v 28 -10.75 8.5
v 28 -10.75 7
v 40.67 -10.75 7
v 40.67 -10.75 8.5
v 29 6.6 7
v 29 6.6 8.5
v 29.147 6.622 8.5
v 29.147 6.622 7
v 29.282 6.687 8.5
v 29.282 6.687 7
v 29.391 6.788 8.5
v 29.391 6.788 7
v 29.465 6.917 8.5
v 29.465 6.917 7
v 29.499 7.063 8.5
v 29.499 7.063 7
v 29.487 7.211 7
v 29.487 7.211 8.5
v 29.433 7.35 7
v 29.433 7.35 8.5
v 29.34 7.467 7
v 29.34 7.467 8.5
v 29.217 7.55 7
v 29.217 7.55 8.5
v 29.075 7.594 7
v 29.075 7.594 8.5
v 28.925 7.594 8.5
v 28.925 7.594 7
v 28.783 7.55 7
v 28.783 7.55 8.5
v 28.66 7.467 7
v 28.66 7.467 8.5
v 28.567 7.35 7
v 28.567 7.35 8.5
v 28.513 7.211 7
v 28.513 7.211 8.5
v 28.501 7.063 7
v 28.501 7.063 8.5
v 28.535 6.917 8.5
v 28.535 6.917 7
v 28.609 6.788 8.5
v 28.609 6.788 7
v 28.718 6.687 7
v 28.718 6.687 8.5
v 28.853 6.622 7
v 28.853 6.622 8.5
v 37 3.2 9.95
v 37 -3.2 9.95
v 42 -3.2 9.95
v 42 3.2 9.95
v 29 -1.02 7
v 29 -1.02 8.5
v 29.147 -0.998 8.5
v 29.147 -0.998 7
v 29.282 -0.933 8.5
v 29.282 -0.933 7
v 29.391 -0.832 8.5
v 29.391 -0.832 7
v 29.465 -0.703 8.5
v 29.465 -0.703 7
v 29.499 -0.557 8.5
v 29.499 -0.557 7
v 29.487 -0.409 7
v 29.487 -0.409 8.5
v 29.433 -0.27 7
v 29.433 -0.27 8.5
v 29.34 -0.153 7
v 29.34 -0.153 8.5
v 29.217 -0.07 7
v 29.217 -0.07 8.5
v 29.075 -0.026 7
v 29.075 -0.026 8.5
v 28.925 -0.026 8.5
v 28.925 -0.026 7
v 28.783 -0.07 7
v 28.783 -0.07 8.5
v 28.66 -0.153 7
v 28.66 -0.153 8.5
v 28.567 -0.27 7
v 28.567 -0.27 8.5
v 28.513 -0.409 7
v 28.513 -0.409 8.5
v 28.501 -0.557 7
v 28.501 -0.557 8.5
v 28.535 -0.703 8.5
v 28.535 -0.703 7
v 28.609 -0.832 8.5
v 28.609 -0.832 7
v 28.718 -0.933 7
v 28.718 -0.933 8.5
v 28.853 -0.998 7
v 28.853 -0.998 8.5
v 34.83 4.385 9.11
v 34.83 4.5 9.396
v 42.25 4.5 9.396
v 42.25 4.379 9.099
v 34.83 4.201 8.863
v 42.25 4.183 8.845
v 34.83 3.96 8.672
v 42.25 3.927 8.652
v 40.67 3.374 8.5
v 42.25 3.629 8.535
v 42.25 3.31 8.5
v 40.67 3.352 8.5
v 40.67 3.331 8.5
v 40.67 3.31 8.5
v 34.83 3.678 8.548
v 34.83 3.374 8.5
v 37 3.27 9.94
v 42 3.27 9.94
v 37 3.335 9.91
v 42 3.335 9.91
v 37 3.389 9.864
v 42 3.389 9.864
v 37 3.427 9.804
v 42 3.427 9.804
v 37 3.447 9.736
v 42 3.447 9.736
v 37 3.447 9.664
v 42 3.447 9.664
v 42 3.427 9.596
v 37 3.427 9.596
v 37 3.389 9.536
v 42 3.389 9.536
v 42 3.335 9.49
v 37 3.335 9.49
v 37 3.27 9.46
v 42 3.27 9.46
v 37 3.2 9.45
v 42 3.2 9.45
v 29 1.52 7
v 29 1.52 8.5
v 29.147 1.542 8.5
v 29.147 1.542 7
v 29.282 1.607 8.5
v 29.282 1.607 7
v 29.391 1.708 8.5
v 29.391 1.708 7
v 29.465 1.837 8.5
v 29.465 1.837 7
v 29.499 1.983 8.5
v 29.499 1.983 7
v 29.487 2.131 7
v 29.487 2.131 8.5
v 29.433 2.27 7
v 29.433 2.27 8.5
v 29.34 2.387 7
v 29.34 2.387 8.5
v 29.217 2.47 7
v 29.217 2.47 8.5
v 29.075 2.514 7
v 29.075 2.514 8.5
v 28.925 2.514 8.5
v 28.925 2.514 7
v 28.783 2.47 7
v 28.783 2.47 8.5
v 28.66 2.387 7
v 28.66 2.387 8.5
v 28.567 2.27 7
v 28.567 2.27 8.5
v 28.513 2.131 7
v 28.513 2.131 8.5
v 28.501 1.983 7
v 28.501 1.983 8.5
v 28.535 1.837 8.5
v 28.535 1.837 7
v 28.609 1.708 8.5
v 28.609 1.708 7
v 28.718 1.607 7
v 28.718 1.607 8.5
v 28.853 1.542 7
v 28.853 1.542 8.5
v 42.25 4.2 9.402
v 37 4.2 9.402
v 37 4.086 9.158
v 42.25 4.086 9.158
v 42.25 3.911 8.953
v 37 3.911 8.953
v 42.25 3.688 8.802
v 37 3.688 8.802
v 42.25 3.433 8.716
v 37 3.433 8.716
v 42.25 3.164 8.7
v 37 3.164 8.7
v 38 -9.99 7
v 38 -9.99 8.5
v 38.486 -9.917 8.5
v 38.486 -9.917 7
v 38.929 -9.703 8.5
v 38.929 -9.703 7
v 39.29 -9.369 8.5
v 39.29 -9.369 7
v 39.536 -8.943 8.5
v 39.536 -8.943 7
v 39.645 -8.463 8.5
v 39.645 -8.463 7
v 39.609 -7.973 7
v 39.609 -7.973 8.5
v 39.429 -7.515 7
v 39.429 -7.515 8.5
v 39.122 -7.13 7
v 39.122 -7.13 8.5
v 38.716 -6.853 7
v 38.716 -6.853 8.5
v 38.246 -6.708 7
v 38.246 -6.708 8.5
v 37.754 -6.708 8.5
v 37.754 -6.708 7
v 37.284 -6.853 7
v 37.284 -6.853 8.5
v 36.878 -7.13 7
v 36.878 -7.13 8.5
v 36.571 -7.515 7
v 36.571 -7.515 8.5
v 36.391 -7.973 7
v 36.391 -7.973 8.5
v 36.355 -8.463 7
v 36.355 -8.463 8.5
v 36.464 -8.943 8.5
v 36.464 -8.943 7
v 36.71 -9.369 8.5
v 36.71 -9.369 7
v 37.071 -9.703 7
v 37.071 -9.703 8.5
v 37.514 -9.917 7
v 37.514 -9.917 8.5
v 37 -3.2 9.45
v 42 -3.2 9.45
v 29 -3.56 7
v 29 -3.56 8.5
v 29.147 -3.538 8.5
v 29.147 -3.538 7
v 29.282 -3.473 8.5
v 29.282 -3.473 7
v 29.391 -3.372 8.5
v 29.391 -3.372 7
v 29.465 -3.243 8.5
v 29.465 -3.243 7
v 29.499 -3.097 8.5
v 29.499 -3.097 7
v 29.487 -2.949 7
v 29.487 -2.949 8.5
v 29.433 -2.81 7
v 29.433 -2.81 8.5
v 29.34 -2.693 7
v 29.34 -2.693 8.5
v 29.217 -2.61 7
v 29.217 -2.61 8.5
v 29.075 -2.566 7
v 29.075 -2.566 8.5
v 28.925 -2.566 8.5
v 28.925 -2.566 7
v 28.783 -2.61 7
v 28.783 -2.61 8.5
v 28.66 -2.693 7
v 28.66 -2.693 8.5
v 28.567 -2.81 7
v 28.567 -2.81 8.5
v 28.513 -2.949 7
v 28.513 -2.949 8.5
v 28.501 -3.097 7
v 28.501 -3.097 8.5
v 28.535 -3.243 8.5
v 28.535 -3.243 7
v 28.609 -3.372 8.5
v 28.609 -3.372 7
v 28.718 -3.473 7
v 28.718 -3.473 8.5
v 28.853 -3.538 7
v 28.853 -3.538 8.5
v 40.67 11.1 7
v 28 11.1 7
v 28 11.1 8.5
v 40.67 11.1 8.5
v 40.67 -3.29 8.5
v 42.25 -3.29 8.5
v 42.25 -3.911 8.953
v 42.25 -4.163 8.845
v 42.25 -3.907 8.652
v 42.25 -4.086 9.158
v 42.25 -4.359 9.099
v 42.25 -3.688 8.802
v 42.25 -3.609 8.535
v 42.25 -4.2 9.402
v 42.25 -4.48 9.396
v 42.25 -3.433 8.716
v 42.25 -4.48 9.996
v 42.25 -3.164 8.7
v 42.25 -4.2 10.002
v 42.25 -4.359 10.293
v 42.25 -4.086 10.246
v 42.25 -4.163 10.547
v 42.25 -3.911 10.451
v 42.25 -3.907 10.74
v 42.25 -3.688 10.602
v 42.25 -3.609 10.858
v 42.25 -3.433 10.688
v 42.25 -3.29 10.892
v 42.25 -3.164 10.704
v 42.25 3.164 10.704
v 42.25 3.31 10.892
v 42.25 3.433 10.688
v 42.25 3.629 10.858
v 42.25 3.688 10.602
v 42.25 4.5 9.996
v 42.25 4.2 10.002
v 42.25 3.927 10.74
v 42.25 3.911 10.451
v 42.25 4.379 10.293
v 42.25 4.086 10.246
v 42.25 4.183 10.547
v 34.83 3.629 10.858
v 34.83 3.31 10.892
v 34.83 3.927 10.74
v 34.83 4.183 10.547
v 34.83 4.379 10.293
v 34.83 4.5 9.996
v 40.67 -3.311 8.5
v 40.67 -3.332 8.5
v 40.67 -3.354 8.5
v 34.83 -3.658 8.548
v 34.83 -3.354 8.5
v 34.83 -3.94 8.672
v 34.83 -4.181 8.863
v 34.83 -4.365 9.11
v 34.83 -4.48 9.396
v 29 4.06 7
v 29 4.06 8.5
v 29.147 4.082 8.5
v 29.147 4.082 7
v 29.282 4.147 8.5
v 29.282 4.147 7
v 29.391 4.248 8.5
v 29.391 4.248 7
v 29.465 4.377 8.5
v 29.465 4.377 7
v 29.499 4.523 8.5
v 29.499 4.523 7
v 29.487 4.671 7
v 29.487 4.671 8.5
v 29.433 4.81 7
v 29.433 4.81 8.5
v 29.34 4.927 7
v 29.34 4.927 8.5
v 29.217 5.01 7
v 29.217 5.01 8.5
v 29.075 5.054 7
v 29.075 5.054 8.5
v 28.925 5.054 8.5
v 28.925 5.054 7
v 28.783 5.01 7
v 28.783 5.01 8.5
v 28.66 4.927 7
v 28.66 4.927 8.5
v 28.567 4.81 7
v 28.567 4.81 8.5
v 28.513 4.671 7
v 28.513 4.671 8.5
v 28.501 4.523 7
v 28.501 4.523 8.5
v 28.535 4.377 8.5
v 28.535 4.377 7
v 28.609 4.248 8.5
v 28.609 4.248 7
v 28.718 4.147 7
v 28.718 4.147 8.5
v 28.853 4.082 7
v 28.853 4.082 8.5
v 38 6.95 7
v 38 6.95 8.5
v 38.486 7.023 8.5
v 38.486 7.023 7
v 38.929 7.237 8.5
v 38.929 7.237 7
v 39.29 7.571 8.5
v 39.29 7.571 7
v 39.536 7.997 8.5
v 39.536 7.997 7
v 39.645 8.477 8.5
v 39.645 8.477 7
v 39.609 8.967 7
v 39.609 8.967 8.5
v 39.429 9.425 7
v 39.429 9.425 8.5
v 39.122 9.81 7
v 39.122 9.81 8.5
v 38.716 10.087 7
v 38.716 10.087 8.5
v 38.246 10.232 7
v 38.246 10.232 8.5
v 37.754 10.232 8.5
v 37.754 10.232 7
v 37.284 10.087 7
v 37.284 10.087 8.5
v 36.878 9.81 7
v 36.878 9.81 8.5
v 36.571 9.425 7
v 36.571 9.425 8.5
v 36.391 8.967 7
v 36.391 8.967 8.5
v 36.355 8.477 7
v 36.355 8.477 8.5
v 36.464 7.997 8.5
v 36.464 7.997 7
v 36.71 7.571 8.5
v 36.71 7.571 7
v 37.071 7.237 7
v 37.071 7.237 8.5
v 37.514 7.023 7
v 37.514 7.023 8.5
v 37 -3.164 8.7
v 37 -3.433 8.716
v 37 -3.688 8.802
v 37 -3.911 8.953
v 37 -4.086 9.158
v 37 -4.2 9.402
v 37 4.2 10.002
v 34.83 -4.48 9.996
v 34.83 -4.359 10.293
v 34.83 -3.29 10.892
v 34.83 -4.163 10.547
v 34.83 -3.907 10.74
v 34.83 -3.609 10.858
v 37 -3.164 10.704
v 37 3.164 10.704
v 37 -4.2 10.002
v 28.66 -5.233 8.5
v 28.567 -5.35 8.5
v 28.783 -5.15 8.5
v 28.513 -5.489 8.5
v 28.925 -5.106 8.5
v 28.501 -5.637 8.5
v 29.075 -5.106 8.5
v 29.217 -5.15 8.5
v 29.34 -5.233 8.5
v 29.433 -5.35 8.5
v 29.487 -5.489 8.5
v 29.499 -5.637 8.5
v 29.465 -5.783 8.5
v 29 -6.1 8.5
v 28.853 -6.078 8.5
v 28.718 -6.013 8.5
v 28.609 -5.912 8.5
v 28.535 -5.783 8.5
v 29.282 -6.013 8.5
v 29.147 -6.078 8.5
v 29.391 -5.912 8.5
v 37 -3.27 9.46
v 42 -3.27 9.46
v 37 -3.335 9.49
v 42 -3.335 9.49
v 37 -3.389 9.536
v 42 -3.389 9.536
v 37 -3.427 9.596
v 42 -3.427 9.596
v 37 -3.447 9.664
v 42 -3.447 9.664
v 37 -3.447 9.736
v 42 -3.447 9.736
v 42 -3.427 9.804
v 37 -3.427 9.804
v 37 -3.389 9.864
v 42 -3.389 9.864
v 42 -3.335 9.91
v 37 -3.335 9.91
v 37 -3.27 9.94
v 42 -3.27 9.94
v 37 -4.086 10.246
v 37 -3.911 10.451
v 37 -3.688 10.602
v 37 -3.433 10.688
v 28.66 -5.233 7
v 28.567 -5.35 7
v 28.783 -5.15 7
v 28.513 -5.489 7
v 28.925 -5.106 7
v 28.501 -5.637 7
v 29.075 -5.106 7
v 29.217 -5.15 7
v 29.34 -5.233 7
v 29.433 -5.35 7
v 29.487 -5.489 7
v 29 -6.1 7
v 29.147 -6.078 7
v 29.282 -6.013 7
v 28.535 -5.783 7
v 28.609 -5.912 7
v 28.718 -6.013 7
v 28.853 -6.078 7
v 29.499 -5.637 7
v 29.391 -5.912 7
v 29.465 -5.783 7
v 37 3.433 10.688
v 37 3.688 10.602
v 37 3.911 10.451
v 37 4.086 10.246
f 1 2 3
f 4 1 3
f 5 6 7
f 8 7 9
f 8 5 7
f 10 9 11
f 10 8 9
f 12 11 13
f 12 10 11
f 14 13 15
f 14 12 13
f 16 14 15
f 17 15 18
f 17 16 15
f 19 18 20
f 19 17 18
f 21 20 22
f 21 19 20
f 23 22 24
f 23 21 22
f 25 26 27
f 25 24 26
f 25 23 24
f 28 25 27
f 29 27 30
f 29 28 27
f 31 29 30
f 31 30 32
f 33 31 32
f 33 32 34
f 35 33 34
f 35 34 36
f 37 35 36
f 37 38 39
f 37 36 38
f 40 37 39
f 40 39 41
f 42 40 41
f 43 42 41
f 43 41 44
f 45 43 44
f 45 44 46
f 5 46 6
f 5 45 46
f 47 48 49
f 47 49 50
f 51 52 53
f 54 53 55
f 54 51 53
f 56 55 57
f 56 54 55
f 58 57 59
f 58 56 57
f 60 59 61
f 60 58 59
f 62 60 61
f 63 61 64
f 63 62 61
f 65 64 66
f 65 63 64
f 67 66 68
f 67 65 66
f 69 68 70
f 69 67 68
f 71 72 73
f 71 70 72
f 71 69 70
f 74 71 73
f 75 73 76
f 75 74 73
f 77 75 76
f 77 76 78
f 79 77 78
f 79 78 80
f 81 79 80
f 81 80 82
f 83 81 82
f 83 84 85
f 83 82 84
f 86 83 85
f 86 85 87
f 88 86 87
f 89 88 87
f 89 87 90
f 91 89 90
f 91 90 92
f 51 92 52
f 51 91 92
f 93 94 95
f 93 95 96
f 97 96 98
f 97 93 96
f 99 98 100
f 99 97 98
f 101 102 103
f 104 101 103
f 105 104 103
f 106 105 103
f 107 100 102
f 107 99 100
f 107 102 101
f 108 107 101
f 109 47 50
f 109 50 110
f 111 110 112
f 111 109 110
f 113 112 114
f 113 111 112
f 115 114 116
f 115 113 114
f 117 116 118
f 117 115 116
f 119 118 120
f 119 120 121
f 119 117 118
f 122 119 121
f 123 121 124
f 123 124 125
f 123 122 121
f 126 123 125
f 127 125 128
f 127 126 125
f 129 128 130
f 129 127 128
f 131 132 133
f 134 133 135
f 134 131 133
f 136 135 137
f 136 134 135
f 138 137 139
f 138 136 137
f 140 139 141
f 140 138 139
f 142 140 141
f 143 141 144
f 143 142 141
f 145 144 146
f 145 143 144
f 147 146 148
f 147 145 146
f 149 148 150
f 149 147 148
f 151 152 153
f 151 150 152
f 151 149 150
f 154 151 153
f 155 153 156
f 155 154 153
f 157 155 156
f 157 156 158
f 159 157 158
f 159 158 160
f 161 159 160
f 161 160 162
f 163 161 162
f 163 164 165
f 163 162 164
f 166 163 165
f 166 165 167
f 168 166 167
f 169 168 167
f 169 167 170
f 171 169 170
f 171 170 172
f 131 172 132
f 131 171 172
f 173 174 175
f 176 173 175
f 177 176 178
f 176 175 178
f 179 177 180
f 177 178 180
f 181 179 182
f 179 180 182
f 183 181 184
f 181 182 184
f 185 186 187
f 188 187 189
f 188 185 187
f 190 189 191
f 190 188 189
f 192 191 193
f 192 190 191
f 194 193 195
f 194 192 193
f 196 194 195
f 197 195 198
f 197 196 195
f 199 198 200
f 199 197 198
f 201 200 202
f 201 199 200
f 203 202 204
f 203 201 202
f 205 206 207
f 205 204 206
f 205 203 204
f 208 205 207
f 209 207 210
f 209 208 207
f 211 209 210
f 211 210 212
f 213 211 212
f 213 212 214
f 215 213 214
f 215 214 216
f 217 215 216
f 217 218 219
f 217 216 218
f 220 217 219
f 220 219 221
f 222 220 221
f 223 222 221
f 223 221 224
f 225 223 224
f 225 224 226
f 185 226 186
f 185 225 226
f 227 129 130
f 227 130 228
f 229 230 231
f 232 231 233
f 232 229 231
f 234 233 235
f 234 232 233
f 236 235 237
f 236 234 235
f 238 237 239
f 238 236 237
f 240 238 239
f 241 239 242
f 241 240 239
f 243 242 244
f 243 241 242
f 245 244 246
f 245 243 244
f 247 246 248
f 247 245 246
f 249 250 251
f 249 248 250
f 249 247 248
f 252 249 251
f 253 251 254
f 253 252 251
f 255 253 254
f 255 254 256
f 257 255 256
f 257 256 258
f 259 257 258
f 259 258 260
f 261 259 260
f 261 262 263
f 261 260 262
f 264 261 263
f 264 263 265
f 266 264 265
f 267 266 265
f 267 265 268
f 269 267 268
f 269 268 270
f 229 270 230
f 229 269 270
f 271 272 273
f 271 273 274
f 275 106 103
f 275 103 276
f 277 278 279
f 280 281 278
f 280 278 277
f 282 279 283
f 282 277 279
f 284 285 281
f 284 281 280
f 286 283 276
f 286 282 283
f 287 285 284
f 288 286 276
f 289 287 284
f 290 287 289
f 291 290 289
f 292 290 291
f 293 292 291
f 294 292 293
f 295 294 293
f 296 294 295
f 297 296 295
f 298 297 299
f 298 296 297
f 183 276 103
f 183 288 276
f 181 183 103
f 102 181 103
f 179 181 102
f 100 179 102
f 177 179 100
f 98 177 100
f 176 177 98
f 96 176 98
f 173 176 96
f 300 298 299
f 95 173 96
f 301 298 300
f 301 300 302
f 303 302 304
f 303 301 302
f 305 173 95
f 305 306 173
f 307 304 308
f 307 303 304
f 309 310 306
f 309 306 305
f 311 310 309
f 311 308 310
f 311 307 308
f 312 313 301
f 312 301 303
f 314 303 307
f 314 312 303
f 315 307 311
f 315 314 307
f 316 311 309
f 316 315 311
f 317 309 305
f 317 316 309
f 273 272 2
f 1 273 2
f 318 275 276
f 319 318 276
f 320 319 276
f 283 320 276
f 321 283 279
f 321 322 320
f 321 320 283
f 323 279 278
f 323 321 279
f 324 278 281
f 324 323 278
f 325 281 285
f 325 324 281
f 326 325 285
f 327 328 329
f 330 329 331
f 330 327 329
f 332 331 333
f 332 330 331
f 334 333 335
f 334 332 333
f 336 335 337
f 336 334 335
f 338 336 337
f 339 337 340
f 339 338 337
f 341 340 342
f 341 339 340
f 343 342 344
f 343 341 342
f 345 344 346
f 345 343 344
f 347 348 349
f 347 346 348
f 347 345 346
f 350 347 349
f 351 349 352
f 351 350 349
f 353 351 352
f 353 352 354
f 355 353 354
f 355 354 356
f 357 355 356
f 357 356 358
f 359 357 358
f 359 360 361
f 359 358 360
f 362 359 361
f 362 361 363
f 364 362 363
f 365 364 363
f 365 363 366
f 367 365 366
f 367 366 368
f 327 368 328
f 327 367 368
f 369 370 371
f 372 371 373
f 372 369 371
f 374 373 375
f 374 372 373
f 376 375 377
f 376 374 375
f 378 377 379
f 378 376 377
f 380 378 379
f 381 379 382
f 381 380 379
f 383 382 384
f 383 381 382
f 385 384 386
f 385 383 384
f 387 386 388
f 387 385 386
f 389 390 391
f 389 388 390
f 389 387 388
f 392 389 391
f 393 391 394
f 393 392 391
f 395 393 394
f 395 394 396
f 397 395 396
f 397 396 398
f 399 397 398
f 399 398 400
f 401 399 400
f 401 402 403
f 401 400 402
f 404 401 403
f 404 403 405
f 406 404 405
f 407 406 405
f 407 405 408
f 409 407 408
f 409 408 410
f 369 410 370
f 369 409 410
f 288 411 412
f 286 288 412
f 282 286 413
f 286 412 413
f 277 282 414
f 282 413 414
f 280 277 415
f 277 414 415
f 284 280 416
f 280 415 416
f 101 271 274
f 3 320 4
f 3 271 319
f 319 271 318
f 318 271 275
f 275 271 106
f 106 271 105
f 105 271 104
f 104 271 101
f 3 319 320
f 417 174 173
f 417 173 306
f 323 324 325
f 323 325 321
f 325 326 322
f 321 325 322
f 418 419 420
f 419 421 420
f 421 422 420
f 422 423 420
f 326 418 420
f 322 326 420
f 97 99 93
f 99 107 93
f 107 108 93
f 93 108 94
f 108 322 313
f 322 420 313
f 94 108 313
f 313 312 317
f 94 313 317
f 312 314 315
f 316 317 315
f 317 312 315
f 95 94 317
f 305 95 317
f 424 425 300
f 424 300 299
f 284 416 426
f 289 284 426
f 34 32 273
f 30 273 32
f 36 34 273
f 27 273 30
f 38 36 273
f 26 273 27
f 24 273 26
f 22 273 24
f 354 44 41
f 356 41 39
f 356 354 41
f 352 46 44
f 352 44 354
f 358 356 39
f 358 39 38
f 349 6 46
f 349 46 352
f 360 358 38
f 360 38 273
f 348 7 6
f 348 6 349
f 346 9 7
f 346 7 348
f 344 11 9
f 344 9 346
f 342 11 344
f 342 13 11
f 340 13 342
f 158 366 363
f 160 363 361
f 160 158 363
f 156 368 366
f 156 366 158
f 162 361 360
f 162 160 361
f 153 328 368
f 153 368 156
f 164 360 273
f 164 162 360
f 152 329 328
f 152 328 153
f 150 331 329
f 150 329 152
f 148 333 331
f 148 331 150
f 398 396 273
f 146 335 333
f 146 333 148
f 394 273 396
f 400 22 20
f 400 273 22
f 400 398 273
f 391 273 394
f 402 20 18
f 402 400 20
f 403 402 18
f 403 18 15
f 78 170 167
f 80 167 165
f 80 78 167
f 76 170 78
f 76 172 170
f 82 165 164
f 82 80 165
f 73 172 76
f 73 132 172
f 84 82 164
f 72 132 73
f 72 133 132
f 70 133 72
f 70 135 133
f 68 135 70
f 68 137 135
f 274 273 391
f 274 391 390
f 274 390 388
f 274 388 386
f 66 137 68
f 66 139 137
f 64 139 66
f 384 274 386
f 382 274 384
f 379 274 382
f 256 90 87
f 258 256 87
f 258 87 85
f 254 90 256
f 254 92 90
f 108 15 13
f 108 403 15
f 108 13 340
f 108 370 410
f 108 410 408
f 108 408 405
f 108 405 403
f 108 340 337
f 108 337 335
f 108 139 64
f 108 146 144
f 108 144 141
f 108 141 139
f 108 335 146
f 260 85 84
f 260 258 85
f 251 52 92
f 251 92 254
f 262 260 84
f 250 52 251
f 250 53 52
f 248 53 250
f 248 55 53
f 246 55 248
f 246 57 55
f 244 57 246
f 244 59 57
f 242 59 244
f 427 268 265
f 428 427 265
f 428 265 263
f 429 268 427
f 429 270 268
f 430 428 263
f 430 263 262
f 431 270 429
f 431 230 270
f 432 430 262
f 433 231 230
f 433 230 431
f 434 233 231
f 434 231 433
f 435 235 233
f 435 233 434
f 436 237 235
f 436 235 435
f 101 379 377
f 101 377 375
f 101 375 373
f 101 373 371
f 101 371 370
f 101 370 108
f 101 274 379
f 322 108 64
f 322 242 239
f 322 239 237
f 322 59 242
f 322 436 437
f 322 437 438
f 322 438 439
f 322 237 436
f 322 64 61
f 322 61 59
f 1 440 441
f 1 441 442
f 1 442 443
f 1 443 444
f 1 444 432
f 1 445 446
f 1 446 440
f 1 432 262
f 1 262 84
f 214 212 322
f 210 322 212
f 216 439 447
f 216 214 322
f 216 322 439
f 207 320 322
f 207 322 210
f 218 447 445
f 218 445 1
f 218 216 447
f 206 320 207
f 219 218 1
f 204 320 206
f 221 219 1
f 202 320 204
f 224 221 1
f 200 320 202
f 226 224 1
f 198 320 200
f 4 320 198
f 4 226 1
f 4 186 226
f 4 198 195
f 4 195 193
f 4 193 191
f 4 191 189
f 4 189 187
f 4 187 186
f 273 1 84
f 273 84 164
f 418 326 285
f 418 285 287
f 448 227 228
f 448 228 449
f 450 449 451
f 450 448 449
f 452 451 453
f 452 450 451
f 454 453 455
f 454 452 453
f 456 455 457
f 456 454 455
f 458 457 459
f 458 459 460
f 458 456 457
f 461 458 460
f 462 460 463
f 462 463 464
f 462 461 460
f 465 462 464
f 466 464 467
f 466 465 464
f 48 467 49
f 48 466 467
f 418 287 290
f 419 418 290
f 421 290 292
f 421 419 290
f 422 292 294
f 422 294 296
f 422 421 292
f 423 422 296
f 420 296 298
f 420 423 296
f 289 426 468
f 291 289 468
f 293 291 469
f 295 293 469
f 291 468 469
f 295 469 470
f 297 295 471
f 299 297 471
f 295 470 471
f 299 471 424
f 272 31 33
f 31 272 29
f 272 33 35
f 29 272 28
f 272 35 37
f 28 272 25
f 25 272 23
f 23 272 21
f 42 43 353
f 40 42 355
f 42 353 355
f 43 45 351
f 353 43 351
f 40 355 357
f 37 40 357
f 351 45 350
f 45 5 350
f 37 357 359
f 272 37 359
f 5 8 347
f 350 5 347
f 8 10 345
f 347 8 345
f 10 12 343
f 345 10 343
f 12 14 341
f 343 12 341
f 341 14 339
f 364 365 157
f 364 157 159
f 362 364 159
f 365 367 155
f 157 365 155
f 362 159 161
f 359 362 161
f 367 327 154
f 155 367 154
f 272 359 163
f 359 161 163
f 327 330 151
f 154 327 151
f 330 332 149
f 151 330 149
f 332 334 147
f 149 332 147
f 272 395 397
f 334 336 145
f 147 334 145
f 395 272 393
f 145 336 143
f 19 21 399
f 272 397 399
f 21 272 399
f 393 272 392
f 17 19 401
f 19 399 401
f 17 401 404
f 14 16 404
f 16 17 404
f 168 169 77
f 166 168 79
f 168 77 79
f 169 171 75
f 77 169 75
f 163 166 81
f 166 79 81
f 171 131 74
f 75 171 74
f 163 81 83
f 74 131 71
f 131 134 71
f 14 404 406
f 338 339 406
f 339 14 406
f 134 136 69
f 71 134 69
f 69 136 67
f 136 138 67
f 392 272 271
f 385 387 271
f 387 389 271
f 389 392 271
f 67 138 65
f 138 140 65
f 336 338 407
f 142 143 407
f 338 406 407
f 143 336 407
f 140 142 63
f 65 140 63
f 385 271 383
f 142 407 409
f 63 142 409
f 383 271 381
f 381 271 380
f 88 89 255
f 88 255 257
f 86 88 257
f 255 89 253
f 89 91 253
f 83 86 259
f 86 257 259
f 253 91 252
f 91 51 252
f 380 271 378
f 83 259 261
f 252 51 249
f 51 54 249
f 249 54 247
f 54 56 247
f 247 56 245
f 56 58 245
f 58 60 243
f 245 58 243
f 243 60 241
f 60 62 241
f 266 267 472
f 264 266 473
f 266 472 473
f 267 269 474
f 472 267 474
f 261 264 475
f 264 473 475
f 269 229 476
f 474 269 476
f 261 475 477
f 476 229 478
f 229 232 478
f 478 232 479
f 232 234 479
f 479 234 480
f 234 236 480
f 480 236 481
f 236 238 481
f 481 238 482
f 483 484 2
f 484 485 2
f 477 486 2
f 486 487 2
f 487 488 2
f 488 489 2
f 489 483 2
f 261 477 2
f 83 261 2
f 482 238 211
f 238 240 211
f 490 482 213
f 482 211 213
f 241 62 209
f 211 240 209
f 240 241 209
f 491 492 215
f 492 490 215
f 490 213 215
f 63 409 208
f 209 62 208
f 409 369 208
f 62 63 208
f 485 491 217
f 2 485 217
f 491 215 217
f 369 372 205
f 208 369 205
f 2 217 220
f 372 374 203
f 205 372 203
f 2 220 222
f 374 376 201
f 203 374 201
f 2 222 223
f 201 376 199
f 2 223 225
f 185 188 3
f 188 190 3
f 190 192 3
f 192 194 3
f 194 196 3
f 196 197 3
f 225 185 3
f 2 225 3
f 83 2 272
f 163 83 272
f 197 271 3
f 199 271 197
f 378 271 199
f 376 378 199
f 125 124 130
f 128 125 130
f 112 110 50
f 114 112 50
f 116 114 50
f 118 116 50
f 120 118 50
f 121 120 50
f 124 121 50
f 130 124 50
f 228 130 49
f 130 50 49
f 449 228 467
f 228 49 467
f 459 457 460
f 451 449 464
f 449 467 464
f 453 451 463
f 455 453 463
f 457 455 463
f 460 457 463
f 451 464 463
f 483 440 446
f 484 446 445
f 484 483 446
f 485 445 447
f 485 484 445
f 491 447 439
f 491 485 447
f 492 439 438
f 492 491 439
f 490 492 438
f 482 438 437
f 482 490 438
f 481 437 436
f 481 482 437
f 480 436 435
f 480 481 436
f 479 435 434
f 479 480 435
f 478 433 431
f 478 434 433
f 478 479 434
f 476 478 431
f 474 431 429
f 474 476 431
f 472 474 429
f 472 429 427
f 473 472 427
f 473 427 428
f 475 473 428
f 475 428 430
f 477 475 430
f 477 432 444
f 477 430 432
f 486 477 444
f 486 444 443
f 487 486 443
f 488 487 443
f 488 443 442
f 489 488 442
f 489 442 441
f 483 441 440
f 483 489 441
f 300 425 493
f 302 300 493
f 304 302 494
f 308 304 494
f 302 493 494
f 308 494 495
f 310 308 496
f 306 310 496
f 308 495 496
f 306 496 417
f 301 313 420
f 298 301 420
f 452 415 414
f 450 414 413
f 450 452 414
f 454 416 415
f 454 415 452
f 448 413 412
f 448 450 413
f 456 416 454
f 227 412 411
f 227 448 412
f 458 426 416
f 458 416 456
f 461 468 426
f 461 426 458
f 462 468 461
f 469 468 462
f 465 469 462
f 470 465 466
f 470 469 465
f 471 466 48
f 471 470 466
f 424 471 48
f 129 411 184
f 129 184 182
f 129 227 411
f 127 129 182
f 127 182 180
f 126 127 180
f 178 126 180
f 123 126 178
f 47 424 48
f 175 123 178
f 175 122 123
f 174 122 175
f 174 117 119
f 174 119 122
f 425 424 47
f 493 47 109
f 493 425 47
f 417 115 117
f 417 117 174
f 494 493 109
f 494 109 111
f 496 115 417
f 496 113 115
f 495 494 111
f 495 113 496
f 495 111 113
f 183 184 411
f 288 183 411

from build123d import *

# Parameters (mm, degrees)
SKETCH043_W             = 21.85
SKETCH043_H             = 12.67
PAD019_DEPTH            = 1.5
PAD020_DEPTH            = 7.42
SKETCH045_R             = 1.65
POCKET018_DEPTH         = 5
SKETCH046_R             = 0.5
POCKET019_DEPTH         = 5
POCKET020_DEPTH         = 6
PAD021_DEPTH            = 5
BODY017_PLACEMENT_ANGLE = 90


with BuildPart() as part:
    # Sketch043 → Pad019 (new body)
    with BuildSketch(Plane.XY):
        with Locations((10.925, 6.335)):
            Rectangle(SKETCH043_W, SKETCH043_H)
    extrude(amount=PAD019_DEPTH)

    # Sketch044 → Pad020 (join)
    with BuildSketch(Plane.XZ.offset(-6.83)):
        with BuildLine():
            Line((6.6, 2.396035), (6.6, 2.996035))
            ThreePointArc((7.79, 3.89207), (7.038545, 3.651836), (6.6, 2.996035))
            Line((7.79, 3.89207), (14.39, 3.89207))
            ThreePointArc((15.58, 2.996035), (15.141455, 3.651836), (14.39, 3.89207))
            Line((15.58, 2.396035), (15.58, 2.996035))
            ThreePointArc((14.39, 1.5), (15.141455, 1.740234), (15.58, 2.396035))
            Line((7.79, 1.5), (14.39, 1.5))
            ThreePointArc((6.6, 2.396035), (7.038545, 1.740234), (7.79, 1.5))
        make_face()
    extrude(amount=-PAD020_DEPTH)

    # Sketch045 → Pocket018 (cut)
    with BuildSketch(Plane.XY):
        with Locations((2.5, 10)):
            Circle(SKETCH045_R)
        with Locations((19.44, 10)):
            Circle(SKETCH045_R)
    extrude(amount=POCKET018_DEPTH, mode=Mode.SUBTRACT)

    # Sketch046 → Pocket019 (cut)
    with BuildSketch(Plane.XY):
        with Locations((4, 1)):
            Circle(SKETCH046_R)
        with Locations((6.54, 1)):
            Circle(SKETCH046_R)
        with Locations((9.08, 1)):
            Circle(SKETCH046_R)
        with Locations((11.62, 1)):
            Circle(SKETCH046_R)
        with Locations((14.16, 1)):
            Circle(SKETCH046_R)
        with Locations((16.7, 1)):
            Circle(SKETCH046_R)
    extrude(amount=POCKET019_DEPTH, mode=Mode.SUBTRACT)

    # Sketch047 → Pocket020 (cut)
    with BuildSketch(Plane.XZ.offset(-9)):
        with BuildLine():
            Line((6.9, 2.402006), (6.9, 3.002006))
            ThreePointArc((7.935662, 3.704011), (7.295255, 3.533843), (6.9, 3.002006))
            Line((7.935662, 3.704011), (14.264338, 3.704011))
            ThreePointArc((15.3, 3.002006), (14.904745, 3.533843), (14.264338, 3.704011))
            Line((15.3, 2.402006), (15.3, 3.002006))
            ThreePointArc((14.264338, 1.7), (14.904745, 1.870168), (15.3, 2.402006))
            Line((7.935662, 1.7), (14.264338, 1.7))
            ThreePointArc((6.9, 2.402006), (7.295255, 1.870168), (7.935662, 1.7))
        make_face()
    extrude(amount=-POCKET020_DEPTH, mode=Mode.SUBTRACT)

    # Sketch048 → Pad021 (join)
    with BuildSketch(Plane.XZ.offset(-9)):
        with BuildLine():
            ThreePointArc((7.9, 2.95), (7.65, 2.7), (7.9, 2.45))
            Line((7.9, 2.45), (14.3, 2.45))
            ThreePointArc((14.3, 2.45), (14.55, 2.7), (14.3, 2.95))
            Line((14.3, 2.95), (7.9, 2.95))
        make_face()
    extrude(amount=-PAD021_DEPTH)


with BuildPart() as part_1:
    # Body017 placement: moved
    add(part.part.moved(Location((28, 11.1, 7))).rotate(Axis((28, 11.1, 7), (0, 0, -1)), BODY017_PLACEMENT_ANGLE))


solid = part_1.part
